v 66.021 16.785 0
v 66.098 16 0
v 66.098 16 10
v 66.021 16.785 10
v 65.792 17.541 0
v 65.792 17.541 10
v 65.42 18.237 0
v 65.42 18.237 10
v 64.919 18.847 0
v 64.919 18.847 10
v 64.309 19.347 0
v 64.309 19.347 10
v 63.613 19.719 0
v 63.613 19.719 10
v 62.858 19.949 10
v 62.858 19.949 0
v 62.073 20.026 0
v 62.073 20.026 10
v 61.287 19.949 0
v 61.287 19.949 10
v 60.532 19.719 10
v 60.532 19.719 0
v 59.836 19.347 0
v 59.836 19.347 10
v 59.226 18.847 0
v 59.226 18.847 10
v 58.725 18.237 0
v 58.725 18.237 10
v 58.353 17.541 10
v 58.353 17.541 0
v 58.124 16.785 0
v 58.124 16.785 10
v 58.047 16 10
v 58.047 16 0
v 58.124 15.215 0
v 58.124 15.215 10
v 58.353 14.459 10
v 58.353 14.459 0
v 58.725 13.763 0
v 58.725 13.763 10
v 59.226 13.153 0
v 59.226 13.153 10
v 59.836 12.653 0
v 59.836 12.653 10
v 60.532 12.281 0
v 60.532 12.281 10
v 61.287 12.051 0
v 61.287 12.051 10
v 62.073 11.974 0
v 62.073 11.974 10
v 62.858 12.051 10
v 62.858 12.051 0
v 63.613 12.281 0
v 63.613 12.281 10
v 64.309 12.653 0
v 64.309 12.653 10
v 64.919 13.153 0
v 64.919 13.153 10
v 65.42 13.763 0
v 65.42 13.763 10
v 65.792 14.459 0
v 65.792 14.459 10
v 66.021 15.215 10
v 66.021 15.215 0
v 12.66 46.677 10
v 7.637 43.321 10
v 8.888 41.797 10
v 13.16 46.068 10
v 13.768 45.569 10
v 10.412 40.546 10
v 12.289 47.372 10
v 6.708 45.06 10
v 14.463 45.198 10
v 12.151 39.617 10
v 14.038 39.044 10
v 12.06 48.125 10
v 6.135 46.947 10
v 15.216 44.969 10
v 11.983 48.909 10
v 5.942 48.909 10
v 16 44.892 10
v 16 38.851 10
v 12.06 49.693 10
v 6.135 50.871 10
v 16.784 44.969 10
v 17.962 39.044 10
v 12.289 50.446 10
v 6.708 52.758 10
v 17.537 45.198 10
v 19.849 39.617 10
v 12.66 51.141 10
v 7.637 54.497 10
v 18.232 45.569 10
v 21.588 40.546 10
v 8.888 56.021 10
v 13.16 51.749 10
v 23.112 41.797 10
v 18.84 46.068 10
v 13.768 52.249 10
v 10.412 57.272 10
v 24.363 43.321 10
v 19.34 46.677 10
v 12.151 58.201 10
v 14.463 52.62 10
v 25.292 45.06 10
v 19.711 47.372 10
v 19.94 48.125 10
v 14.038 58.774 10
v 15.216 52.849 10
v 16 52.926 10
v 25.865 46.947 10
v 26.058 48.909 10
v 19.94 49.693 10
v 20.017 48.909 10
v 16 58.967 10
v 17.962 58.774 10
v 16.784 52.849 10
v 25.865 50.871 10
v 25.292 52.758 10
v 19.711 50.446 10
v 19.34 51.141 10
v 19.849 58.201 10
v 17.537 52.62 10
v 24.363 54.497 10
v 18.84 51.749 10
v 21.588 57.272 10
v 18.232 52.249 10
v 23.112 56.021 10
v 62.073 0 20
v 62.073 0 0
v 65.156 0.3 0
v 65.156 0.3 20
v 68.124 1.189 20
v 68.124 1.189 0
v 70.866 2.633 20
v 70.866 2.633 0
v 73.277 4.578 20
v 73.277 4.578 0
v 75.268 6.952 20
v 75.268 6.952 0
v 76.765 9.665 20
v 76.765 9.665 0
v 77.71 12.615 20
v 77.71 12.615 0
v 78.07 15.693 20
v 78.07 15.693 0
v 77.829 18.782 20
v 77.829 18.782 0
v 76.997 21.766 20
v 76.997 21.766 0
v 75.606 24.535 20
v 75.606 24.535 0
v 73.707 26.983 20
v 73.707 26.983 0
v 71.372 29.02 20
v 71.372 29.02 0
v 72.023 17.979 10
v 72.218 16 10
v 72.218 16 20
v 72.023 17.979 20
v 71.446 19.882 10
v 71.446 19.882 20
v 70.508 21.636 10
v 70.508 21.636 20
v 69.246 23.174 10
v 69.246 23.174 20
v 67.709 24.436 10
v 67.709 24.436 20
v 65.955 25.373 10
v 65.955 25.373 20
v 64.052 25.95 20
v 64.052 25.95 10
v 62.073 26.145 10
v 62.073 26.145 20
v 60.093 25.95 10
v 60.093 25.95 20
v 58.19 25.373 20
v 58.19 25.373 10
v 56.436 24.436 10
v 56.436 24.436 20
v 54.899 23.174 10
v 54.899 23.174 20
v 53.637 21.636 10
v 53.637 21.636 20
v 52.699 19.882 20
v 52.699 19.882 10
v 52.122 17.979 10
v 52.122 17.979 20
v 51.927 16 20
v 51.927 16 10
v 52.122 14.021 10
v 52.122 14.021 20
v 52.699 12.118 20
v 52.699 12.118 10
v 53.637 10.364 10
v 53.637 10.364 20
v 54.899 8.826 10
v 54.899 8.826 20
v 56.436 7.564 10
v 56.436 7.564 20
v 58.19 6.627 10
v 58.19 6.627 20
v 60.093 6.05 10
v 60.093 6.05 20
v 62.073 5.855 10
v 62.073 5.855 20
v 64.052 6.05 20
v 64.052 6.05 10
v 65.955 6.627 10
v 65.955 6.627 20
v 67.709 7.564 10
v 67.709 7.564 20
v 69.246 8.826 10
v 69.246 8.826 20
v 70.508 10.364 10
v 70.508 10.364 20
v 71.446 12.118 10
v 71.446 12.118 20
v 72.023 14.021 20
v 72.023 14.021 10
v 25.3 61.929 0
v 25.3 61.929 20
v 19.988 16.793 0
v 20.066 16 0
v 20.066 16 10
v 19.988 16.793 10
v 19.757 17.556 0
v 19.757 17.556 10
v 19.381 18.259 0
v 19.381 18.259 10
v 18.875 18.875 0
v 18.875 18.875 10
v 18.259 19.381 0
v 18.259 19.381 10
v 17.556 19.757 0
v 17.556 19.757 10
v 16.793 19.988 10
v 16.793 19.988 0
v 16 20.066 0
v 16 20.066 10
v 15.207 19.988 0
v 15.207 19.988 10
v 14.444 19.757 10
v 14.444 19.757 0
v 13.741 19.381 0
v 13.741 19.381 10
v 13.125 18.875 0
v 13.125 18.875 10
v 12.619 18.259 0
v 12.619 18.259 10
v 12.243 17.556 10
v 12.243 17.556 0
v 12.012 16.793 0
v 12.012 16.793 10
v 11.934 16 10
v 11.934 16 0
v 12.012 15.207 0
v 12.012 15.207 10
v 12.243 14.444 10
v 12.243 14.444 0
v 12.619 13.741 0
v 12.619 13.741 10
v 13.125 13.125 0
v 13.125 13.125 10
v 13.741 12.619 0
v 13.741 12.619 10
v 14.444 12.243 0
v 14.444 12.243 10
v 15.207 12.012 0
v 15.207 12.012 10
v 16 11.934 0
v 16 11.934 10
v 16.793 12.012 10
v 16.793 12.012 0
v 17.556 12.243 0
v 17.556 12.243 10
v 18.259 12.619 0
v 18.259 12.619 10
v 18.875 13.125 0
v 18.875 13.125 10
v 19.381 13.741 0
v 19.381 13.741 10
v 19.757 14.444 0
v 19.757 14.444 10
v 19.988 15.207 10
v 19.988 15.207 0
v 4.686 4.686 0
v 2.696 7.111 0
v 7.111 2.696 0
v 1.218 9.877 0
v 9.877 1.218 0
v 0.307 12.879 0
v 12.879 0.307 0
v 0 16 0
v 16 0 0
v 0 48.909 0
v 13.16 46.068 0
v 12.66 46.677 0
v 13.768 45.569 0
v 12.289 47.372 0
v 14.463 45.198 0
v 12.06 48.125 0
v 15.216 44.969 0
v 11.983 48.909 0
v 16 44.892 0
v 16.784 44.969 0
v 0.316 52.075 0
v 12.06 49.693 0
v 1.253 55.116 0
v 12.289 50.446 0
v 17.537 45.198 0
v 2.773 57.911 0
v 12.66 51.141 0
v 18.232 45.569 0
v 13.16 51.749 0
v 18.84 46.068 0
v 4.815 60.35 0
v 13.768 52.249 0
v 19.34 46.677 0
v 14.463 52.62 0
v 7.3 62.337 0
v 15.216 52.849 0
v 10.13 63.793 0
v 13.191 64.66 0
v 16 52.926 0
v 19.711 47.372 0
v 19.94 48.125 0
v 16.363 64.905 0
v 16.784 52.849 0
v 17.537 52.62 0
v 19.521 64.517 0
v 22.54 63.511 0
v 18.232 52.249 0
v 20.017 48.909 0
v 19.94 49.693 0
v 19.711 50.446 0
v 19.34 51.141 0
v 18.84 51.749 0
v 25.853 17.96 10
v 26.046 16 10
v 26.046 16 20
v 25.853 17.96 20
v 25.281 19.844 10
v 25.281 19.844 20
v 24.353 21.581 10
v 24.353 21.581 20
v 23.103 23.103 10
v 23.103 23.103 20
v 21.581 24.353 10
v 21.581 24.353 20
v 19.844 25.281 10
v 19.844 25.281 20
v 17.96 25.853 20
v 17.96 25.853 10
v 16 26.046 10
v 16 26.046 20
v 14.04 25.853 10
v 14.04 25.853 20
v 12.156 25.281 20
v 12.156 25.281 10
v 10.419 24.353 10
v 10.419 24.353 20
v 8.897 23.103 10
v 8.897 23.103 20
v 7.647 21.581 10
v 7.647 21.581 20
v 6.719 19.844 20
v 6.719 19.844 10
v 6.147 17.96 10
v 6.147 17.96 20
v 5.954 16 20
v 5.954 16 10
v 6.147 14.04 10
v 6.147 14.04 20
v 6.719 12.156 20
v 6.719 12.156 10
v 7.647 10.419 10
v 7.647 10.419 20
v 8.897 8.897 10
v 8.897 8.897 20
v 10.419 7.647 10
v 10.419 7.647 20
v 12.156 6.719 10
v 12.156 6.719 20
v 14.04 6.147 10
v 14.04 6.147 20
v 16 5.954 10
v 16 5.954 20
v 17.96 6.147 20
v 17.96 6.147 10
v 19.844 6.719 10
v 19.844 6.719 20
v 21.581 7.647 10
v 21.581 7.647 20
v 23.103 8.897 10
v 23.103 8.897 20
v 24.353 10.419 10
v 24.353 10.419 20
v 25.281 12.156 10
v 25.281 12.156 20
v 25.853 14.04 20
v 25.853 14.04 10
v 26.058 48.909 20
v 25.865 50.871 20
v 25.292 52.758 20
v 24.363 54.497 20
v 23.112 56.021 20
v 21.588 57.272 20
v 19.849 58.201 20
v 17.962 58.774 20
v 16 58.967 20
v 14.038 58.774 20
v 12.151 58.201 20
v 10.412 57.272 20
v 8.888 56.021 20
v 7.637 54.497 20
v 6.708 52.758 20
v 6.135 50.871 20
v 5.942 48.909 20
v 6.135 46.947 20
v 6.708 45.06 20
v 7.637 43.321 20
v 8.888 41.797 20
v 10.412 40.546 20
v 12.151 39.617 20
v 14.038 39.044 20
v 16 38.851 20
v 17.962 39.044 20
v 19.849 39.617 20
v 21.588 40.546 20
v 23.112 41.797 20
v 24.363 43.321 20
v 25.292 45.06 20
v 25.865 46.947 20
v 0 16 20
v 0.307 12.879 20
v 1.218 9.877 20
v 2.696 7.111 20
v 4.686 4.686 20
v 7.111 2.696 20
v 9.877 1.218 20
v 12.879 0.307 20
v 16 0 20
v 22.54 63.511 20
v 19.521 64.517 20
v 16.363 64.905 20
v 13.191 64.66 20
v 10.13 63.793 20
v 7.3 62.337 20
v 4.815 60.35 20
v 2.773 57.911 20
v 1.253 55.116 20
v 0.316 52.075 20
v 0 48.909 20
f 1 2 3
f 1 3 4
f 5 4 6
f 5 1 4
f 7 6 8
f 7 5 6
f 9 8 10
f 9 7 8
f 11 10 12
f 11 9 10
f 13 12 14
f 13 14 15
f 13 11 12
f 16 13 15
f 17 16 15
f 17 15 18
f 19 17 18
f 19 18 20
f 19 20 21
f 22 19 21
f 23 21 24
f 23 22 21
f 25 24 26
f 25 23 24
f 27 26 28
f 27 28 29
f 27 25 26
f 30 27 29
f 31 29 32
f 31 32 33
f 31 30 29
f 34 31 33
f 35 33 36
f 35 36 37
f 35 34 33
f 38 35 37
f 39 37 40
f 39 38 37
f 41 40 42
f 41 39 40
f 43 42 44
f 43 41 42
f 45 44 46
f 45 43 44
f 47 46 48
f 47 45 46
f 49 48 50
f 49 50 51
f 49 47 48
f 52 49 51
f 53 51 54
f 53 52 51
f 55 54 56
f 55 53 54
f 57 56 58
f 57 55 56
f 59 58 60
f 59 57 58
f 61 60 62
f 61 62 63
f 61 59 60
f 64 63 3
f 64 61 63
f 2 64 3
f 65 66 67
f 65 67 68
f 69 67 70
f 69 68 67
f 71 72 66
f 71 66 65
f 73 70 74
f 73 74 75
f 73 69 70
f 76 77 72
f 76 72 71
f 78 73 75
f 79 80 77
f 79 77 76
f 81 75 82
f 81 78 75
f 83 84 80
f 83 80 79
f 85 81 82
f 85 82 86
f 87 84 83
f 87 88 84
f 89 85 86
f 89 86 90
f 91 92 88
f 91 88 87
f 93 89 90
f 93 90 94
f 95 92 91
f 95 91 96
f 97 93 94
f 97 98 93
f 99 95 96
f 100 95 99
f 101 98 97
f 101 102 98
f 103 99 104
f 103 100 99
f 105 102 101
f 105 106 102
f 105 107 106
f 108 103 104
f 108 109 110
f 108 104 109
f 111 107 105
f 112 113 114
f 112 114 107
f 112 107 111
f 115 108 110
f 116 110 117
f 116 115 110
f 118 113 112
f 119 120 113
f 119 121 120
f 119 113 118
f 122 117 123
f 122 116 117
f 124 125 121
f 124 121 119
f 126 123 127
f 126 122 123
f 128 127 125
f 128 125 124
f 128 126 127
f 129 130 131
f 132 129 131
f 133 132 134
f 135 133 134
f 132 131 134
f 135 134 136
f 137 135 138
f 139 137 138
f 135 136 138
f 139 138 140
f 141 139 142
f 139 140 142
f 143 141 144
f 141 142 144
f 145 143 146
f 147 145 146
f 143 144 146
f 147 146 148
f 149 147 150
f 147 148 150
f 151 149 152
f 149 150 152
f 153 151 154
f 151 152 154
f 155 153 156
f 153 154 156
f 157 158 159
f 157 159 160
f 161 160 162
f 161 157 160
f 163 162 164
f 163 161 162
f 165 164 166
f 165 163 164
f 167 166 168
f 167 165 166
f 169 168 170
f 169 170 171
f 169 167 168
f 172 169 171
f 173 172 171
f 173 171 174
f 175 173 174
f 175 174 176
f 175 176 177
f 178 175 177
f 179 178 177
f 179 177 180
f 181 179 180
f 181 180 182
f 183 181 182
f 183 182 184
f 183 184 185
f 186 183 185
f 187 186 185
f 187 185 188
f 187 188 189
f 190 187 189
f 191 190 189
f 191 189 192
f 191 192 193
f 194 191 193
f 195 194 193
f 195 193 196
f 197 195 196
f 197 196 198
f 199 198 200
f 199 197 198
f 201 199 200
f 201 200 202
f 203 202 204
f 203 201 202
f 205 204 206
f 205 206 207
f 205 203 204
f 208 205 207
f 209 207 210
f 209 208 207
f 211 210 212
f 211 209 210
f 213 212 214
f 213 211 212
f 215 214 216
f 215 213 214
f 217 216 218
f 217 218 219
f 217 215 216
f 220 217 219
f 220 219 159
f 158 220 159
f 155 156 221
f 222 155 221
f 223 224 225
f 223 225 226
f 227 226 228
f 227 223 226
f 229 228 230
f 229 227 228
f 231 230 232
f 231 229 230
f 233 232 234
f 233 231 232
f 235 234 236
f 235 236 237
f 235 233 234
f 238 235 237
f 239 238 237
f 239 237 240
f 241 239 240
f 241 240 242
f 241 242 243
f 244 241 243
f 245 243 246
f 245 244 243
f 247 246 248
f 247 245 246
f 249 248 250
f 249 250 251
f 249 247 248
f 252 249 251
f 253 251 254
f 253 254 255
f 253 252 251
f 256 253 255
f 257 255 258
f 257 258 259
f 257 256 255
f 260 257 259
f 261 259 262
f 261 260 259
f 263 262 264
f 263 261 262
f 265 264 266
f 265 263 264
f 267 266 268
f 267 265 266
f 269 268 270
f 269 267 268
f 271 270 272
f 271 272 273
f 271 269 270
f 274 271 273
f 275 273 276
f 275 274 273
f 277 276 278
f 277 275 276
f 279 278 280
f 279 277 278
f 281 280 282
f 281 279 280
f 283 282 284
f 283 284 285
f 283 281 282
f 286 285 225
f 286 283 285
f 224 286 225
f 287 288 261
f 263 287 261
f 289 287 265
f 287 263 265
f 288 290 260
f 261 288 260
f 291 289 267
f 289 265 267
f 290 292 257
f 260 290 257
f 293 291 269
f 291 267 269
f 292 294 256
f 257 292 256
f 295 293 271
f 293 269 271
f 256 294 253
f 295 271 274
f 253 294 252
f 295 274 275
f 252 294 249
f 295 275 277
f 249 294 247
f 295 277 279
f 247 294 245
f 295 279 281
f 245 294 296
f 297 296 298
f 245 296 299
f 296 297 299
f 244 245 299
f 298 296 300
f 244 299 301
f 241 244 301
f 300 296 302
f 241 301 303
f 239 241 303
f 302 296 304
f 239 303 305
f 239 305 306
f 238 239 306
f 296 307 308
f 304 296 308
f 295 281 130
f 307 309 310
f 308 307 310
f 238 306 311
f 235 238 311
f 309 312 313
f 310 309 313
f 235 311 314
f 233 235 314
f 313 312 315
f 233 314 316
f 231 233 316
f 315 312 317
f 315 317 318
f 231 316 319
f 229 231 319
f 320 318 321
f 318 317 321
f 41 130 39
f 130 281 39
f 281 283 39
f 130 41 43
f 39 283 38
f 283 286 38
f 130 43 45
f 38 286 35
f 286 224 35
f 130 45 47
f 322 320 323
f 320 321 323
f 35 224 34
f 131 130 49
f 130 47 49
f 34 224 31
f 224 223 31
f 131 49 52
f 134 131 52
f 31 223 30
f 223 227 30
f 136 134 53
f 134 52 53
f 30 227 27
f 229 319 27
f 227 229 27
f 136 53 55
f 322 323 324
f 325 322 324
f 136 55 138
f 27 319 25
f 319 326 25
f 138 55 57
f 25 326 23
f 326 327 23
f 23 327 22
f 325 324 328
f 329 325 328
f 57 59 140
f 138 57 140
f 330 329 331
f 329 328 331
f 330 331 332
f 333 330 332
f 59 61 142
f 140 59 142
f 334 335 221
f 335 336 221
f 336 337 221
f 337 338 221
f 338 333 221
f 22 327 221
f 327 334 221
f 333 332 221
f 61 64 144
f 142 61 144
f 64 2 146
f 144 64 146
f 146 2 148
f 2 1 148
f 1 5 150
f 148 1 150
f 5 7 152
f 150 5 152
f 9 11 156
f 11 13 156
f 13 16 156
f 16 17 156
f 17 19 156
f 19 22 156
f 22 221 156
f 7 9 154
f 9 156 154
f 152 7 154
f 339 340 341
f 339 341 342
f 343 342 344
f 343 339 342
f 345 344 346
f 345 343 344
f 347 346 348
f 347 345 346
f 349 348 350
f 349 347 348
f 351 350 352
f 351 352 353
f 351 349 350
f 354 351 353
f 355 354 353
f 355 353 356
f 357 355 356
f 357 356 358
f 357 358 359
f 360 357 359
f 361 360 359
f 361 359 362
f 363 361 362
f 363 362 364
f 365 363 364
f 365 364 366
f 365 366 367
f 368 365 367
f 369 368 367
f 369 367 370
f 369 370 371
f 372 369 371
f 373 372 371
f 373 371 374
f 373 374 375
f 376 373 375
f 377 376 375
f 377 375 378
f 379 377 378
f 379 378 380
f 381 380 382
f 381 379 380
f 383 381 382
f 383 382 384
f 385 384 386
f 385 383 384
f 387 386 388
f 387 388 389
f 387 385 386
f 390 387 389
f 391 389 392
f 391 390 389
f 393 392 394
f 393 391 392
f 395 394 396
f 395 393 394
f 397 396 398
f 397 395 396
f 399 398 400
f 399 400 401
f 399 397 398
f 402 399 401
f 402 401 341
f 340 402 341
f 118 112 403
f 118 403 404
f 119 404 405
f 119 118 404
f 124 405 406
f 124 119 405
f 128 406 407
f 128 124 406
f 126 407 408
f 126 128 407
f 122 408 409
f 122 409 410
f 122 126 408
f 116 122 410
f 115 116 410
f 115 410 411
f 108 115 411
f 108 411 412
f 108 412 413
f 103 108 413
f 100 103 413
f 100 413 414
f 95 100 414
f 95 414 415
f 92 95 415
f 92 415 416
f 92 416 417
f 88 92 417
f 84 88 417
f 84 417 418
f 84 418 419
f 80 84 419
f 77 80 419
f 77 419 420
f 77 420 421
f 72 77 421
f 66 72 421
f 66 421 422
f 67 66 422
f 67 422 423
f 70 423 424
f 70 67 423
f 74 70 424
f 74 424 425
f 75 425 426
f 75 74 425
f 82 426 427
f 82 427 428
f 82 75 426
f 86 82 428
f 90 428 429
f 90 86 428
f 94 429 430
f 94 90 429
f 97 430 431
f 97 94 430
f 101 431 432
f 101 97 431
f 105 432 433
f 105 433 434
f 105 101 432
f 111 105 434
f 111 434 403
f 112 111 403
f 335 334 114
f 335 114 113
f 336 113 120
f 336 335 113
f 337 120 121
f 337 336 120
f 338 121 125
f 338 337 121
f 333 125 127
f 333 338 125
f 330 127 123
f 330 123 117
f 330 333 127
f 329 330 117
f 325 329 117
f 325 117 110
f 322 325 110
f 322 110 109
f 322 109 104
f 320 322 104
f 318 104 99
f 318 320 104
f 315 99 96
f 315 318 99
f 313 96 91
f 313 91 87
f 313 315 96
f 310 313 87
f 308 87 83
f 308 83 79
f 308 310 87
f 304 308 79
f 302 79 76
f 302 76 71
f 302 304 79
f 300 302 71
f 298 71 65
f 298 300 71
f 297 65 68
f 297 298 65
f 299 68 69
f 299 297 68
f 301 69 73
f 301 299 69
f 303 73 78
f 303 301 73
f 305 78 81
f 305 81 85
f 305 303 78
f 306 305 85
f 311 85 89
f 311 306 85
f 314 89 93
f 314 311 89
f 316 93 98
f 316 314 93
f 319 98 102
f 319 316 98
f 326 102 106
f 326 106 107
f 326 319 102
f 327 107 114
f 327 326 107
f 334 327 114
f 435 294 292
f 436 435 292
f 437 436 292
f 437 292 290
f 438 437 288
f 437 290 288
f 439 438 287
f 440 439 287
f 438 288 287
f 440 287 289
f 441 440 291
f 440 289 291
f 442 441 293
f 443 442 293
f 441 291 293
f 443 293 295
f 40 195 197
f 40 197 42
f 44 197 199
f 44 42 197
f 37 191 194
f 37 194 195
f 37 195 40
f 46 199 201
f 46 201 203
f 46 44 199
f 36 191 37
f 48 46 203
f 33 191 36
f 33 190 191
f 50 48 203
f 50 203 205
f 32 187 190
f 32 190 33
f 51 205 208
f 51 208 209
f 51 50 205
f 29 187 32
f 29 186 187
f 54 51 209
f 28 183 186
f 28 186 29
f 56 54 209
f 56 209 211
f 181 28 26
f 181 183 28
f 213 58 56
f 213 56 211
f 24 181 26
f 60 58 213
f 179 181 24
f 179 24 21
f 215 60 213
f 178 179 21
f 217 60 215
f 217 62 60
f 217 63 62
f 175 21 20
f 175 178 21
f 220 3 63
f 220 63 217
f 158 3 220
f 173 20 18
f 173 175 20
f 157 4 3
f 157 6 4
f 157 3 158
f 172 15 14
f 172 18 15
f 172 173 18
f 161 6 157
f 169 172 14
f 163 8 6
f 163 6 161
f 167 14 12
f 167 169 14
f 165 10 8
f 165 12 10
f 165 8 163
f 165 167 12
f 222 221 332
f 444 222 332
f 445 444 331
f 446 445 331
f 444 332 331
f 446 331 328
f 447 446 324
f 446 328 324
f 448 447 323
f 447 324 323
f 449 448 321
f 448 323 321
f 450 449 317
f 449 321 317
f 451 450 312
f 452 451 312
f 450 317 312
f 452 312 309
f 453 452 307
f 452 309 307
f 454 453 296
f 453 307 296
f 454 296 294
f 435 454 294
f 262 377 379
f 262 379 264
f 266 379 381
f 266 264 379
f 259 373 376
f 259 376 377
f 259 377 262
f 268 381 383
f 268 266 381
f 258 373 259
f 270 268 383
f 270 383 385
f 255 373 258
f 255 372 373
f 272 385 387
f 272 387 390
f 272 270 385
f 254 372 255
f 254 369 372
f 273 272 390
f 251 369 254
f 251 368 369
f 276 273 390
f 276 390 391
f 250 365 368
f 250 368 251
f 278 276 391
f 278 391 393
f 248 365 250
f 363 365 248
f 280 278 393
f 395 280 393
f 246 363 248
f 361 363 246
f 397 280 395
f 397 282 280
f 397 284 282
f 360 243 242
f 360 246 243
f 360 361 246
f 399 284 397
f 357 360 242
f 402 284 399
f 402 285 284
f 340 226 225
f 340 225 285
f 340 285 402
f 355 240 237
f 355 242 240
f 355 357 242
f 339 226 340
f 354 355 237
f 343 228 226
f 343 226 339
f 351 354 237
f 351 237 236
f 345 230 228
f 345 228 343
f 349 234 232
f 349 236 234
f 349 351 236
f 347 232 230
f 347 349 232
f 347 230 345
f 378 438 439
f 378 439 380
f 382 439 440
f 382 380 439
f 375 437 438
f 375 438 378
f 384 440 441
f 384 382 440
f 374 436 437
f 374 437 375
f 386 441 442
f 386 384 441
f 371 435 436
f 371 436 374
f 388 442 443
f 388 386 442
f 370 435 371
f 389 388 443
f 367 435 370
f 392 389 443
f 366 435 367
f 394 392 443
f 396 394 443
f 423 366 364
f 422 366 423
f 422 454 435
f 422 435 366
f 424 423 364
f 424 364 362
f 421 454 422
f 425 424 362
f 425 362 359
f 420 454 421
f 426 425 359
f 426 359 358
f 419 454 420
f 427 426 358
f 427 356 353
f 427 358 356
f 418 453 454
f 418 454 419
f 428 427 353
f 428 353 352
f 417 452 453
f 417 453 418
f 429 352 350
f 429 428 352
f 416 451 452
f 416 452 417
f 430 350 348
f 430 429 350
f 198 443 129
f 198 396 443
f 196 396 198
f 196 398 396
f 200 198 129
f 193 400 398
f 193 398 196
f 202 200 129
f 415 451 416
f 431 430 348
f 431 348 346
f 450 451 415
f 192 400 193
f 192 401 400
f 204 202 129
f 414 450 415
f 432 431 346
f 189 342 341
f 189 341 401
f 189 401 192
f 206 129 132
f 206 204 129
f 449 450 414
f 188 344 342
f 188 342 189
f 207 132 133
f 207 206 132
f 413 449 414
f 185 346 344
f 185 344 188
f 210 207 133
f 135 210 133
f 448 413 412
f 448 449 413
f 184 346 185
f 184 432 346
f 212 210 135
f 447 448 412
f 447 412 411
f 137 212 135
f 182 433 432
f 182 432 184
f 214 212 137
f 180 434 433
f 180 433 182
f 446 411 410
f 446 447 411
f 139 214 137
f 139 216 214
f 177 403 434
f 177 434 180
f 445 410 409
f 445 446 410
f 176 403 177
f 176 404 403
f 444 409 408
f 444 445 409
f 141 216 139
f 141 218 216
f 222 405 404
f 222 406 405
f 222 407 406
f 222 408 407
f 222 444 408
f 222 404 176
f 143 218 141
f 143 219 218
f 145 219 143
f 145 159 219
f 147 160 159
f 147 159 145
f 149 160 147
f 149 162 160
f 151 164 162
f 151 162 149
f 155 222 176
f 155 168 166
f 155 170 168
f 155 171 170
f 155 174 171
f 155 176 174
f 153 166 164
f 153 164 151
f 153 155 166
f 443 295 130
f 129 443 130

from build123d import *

# Parameters (mm, degrees)
F0_R     = 10.045621
F0_R_2   = 10.145405
F0_R_3   = 10.057845
F1_DEPTH = 20
F0_R_4   = 4.017037
F0_R_5   = 4.066063
F0_R_6   = 4.025873
F2_DEPTH = 10


with BuildPart() as f1:
    # F0 (on Top) → F1 (new body)
    with BuildSketch(Plane.XY):
        with BuildLine():
            ThreePointArc((0, 16), (4.686292, 4.686292), (16, 0))
            Line((16, 0), (62.072559, 0))
            ThreePointArc((62.072559, 0), (77.309287, 11.117161), (71.37237, 29.019736))
            Line((71.37237, 29.019736), (25.299811, 61.928706))
            ThreePointArc((25.299811, 61.928706), (8.678695, 63.135653), (0, 48.908971))
            Line((0, 48.908971), (0, 16))
        make_face()
        with Locations((16, 16)):
            Circle(F0_R, mode=Mode.SUBTRACT)
        with Locations((62.072559, 16)):
            Circle(F0_R_2, mode=Mode.SUBTRACT)
        with Locations((16, 48.908971)):
            Circle(F0_R_3, mode=Mode.SUBTRACT)
    extrude(amount=F1_DEPTH)

    # F0 (on Top) → F2 (join)
    with BuildSketch(Plane.XY):
        with Locations((16, 48.908971)):
            Circle(F0_R_3)
        with Locations((16, 48.908971)):
            Circle(F0_R_4, mode=Mode.SUBTRACT)
        with Locations((16, 16)):
            Circle(F0_R)
        with Locations((16, 16)):
            Circle(F0_R_5, mode=Mode.SUBTRACT)
        with Locations((62.072559, 16)):
            Circle(F0_R_2)
        with Locations((62.072559, 16)):
            Circle(F0_R_6, mode=Mode.SUBTRACT)
    extrude(amount=F2_DEPTH)


solid = f1.part
